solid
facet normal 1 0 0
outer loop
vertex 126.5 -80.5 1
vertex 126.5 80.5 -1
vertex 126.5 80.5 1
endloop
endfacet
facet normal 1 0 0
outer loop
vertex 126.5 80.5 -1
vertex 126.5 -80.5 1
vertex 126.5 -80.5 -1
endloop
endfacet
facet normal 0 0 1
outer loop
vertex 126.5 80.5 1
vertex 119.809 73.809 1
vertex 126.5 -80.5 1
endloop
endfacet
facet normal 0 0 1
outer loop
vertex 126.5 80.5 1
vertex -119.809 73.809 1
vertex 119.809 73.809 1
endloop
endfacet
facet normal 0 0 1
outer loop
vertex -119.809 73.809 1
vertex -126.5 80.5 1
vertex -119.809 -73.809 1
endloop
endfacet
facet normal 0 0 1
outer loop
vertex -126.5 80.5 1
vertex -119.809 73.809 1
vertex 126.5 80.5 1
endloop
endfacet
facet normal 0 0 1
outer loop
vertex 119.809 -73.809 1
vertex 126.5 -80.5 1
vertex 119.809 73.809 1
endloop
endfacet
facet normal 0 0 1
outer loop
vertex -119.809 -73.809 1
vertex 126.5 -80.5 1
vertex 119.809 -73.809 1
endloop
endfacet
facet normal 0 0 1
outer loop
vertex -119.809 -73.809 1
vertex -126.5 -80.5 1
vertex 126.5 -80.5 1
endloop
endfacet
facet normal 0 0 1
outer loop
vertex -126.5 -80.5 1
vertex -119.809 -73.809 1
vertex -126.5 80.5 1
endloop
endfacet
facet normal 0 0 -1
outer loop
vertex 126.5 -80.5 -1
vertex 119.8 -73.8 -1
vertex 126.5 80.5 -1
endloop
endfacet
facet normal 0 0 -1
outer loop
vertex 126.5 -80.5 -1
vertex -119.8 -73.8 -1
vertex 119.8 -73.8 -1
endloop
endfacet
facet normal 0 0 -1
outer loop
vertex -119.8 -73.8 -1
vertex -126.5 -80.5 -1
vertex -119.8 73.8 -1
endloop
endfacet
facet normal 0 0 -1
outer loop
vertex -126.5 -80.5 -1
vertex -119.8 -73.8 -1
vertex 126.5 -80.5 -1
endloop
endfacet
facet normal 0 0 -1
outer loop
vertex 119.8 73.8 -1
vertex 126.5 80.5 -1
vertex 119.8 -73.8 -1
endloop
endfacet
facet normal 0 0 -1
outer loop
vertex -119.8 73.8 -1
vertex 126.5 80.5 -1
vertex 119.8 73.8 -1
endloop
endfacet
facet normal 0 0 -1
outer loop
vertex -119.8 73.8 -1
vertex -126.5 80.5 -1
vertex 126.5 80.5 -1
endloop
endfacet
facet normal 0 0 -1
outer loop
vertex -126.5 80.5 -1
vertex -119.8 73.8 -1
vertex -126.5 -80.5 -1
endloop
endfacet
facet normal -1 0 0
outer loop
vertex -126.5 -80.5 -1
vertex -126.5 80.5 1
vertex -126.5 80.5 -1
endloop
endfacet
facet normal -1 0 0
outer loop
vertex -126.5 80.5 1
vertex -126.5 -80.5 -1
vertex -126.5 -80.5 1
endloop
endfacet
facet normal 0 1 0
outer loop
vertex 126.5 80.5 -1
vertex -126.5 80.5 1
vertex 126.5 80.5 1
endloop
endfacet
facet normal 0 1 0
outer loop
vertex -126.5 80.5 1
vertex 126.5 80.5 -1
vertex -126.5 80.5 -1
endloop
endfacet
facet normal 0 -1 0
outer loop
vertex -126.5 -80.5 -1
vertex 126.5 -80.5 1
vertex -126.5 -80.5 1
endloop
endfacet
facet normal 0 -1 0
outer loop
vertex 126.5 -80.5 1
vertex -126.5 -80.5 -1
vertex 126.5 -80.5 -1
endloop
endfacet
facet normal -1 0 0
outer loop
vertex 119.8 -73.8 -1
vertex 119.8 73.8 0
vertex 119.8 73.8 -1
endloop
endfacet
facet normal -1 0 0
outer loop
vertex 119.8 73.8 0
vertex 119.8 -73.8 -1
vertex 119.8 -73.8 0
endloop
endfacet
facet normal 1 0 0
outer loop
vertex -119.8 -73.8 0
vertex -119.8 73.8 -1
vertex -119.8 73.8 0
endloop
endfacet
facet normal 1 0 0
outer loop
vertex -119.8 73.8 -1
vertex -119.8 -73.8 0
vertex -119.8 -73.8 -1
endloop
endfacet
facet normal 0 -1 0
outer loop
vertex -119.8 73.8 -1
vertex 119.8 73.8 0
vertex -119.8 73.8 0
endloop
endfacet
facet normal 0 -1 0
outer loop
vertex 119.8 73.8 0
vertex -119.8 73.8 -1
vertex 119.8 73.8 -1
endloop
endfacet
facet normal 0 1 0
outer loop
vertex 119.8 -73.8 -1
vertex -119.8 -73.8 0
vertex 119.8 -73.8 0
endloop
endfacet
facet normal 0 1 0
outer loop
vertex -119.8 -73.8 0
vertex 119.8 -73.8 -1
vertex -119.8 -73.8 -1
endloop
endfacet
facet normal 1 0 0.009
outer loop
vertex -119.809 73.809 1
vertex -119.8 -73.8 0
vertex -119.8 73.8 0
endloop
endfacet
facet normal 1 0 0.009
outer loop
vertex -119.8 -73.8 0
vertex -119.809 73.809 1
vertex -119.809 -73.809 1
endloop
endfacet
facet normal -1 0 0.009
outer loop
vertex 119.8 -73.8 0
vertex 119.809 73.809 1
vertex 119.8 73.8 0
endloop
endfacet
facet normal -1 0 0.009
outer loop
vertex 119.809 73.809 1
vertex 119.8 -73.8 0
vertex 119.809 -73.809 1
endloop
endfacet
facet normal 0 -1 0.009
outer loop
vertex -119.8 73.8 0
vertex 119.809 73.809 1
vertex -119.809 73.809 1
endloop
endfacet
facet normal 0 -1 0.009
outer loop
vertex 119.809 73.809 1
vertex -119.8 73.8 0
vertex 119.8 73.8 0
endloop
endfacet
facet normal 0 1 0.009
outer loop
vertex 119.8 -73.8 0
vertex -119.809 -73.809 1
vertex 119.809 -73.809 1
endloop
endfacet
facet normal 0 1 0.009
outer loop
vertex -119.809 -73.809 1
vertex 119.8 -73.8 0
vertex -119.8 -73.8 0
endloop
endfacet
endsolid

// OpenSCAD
// 10.1" Waveshare DSI front frame
// Outer glass: 239 x 147 mm
// Border: 7 mm, inner bevel 30°

glass_w = 239;
glass_h = 147;

border = 7;
tol    = 0.3;      // хлабина към стъклото
thick  = 2.0;      // обща дебелина на рамката
bevel_angle = 30;  // вътрешен скос

module frame() {
    outer_w = glass_w + 2*border;
    outer_h = glass_h + 2*border;
    inner_w = glass_w + 2*tol;
    inner_h = glass_h + 2*tol;

    // основна плоча
    difference() {
        // външен контур
        cube([outer_w, outer_h, thick], center=true);

        // прав вътрешен отвор (дъното на скоса)
        translate([0,0,-0.01])
            cube([inner_w, inner_h, thick+0.02], center=true);

        // скос – изрязваме клин към отвора
        bevel_h = thick; // целия профил
        bevel_offset = (thick) * tan(bevel_angle * PI/180);

        translate([0,0,thick/2])
        linear_extrude(height=bevel_h, center=true, scale=[
            (inner_w + 2*bevel_offset)/inner_w,
            (inner_h + 2*bevel_offset)/inner_h
        ])
            square([inner_w, inner_h], center=true);
    }
}

frame();
